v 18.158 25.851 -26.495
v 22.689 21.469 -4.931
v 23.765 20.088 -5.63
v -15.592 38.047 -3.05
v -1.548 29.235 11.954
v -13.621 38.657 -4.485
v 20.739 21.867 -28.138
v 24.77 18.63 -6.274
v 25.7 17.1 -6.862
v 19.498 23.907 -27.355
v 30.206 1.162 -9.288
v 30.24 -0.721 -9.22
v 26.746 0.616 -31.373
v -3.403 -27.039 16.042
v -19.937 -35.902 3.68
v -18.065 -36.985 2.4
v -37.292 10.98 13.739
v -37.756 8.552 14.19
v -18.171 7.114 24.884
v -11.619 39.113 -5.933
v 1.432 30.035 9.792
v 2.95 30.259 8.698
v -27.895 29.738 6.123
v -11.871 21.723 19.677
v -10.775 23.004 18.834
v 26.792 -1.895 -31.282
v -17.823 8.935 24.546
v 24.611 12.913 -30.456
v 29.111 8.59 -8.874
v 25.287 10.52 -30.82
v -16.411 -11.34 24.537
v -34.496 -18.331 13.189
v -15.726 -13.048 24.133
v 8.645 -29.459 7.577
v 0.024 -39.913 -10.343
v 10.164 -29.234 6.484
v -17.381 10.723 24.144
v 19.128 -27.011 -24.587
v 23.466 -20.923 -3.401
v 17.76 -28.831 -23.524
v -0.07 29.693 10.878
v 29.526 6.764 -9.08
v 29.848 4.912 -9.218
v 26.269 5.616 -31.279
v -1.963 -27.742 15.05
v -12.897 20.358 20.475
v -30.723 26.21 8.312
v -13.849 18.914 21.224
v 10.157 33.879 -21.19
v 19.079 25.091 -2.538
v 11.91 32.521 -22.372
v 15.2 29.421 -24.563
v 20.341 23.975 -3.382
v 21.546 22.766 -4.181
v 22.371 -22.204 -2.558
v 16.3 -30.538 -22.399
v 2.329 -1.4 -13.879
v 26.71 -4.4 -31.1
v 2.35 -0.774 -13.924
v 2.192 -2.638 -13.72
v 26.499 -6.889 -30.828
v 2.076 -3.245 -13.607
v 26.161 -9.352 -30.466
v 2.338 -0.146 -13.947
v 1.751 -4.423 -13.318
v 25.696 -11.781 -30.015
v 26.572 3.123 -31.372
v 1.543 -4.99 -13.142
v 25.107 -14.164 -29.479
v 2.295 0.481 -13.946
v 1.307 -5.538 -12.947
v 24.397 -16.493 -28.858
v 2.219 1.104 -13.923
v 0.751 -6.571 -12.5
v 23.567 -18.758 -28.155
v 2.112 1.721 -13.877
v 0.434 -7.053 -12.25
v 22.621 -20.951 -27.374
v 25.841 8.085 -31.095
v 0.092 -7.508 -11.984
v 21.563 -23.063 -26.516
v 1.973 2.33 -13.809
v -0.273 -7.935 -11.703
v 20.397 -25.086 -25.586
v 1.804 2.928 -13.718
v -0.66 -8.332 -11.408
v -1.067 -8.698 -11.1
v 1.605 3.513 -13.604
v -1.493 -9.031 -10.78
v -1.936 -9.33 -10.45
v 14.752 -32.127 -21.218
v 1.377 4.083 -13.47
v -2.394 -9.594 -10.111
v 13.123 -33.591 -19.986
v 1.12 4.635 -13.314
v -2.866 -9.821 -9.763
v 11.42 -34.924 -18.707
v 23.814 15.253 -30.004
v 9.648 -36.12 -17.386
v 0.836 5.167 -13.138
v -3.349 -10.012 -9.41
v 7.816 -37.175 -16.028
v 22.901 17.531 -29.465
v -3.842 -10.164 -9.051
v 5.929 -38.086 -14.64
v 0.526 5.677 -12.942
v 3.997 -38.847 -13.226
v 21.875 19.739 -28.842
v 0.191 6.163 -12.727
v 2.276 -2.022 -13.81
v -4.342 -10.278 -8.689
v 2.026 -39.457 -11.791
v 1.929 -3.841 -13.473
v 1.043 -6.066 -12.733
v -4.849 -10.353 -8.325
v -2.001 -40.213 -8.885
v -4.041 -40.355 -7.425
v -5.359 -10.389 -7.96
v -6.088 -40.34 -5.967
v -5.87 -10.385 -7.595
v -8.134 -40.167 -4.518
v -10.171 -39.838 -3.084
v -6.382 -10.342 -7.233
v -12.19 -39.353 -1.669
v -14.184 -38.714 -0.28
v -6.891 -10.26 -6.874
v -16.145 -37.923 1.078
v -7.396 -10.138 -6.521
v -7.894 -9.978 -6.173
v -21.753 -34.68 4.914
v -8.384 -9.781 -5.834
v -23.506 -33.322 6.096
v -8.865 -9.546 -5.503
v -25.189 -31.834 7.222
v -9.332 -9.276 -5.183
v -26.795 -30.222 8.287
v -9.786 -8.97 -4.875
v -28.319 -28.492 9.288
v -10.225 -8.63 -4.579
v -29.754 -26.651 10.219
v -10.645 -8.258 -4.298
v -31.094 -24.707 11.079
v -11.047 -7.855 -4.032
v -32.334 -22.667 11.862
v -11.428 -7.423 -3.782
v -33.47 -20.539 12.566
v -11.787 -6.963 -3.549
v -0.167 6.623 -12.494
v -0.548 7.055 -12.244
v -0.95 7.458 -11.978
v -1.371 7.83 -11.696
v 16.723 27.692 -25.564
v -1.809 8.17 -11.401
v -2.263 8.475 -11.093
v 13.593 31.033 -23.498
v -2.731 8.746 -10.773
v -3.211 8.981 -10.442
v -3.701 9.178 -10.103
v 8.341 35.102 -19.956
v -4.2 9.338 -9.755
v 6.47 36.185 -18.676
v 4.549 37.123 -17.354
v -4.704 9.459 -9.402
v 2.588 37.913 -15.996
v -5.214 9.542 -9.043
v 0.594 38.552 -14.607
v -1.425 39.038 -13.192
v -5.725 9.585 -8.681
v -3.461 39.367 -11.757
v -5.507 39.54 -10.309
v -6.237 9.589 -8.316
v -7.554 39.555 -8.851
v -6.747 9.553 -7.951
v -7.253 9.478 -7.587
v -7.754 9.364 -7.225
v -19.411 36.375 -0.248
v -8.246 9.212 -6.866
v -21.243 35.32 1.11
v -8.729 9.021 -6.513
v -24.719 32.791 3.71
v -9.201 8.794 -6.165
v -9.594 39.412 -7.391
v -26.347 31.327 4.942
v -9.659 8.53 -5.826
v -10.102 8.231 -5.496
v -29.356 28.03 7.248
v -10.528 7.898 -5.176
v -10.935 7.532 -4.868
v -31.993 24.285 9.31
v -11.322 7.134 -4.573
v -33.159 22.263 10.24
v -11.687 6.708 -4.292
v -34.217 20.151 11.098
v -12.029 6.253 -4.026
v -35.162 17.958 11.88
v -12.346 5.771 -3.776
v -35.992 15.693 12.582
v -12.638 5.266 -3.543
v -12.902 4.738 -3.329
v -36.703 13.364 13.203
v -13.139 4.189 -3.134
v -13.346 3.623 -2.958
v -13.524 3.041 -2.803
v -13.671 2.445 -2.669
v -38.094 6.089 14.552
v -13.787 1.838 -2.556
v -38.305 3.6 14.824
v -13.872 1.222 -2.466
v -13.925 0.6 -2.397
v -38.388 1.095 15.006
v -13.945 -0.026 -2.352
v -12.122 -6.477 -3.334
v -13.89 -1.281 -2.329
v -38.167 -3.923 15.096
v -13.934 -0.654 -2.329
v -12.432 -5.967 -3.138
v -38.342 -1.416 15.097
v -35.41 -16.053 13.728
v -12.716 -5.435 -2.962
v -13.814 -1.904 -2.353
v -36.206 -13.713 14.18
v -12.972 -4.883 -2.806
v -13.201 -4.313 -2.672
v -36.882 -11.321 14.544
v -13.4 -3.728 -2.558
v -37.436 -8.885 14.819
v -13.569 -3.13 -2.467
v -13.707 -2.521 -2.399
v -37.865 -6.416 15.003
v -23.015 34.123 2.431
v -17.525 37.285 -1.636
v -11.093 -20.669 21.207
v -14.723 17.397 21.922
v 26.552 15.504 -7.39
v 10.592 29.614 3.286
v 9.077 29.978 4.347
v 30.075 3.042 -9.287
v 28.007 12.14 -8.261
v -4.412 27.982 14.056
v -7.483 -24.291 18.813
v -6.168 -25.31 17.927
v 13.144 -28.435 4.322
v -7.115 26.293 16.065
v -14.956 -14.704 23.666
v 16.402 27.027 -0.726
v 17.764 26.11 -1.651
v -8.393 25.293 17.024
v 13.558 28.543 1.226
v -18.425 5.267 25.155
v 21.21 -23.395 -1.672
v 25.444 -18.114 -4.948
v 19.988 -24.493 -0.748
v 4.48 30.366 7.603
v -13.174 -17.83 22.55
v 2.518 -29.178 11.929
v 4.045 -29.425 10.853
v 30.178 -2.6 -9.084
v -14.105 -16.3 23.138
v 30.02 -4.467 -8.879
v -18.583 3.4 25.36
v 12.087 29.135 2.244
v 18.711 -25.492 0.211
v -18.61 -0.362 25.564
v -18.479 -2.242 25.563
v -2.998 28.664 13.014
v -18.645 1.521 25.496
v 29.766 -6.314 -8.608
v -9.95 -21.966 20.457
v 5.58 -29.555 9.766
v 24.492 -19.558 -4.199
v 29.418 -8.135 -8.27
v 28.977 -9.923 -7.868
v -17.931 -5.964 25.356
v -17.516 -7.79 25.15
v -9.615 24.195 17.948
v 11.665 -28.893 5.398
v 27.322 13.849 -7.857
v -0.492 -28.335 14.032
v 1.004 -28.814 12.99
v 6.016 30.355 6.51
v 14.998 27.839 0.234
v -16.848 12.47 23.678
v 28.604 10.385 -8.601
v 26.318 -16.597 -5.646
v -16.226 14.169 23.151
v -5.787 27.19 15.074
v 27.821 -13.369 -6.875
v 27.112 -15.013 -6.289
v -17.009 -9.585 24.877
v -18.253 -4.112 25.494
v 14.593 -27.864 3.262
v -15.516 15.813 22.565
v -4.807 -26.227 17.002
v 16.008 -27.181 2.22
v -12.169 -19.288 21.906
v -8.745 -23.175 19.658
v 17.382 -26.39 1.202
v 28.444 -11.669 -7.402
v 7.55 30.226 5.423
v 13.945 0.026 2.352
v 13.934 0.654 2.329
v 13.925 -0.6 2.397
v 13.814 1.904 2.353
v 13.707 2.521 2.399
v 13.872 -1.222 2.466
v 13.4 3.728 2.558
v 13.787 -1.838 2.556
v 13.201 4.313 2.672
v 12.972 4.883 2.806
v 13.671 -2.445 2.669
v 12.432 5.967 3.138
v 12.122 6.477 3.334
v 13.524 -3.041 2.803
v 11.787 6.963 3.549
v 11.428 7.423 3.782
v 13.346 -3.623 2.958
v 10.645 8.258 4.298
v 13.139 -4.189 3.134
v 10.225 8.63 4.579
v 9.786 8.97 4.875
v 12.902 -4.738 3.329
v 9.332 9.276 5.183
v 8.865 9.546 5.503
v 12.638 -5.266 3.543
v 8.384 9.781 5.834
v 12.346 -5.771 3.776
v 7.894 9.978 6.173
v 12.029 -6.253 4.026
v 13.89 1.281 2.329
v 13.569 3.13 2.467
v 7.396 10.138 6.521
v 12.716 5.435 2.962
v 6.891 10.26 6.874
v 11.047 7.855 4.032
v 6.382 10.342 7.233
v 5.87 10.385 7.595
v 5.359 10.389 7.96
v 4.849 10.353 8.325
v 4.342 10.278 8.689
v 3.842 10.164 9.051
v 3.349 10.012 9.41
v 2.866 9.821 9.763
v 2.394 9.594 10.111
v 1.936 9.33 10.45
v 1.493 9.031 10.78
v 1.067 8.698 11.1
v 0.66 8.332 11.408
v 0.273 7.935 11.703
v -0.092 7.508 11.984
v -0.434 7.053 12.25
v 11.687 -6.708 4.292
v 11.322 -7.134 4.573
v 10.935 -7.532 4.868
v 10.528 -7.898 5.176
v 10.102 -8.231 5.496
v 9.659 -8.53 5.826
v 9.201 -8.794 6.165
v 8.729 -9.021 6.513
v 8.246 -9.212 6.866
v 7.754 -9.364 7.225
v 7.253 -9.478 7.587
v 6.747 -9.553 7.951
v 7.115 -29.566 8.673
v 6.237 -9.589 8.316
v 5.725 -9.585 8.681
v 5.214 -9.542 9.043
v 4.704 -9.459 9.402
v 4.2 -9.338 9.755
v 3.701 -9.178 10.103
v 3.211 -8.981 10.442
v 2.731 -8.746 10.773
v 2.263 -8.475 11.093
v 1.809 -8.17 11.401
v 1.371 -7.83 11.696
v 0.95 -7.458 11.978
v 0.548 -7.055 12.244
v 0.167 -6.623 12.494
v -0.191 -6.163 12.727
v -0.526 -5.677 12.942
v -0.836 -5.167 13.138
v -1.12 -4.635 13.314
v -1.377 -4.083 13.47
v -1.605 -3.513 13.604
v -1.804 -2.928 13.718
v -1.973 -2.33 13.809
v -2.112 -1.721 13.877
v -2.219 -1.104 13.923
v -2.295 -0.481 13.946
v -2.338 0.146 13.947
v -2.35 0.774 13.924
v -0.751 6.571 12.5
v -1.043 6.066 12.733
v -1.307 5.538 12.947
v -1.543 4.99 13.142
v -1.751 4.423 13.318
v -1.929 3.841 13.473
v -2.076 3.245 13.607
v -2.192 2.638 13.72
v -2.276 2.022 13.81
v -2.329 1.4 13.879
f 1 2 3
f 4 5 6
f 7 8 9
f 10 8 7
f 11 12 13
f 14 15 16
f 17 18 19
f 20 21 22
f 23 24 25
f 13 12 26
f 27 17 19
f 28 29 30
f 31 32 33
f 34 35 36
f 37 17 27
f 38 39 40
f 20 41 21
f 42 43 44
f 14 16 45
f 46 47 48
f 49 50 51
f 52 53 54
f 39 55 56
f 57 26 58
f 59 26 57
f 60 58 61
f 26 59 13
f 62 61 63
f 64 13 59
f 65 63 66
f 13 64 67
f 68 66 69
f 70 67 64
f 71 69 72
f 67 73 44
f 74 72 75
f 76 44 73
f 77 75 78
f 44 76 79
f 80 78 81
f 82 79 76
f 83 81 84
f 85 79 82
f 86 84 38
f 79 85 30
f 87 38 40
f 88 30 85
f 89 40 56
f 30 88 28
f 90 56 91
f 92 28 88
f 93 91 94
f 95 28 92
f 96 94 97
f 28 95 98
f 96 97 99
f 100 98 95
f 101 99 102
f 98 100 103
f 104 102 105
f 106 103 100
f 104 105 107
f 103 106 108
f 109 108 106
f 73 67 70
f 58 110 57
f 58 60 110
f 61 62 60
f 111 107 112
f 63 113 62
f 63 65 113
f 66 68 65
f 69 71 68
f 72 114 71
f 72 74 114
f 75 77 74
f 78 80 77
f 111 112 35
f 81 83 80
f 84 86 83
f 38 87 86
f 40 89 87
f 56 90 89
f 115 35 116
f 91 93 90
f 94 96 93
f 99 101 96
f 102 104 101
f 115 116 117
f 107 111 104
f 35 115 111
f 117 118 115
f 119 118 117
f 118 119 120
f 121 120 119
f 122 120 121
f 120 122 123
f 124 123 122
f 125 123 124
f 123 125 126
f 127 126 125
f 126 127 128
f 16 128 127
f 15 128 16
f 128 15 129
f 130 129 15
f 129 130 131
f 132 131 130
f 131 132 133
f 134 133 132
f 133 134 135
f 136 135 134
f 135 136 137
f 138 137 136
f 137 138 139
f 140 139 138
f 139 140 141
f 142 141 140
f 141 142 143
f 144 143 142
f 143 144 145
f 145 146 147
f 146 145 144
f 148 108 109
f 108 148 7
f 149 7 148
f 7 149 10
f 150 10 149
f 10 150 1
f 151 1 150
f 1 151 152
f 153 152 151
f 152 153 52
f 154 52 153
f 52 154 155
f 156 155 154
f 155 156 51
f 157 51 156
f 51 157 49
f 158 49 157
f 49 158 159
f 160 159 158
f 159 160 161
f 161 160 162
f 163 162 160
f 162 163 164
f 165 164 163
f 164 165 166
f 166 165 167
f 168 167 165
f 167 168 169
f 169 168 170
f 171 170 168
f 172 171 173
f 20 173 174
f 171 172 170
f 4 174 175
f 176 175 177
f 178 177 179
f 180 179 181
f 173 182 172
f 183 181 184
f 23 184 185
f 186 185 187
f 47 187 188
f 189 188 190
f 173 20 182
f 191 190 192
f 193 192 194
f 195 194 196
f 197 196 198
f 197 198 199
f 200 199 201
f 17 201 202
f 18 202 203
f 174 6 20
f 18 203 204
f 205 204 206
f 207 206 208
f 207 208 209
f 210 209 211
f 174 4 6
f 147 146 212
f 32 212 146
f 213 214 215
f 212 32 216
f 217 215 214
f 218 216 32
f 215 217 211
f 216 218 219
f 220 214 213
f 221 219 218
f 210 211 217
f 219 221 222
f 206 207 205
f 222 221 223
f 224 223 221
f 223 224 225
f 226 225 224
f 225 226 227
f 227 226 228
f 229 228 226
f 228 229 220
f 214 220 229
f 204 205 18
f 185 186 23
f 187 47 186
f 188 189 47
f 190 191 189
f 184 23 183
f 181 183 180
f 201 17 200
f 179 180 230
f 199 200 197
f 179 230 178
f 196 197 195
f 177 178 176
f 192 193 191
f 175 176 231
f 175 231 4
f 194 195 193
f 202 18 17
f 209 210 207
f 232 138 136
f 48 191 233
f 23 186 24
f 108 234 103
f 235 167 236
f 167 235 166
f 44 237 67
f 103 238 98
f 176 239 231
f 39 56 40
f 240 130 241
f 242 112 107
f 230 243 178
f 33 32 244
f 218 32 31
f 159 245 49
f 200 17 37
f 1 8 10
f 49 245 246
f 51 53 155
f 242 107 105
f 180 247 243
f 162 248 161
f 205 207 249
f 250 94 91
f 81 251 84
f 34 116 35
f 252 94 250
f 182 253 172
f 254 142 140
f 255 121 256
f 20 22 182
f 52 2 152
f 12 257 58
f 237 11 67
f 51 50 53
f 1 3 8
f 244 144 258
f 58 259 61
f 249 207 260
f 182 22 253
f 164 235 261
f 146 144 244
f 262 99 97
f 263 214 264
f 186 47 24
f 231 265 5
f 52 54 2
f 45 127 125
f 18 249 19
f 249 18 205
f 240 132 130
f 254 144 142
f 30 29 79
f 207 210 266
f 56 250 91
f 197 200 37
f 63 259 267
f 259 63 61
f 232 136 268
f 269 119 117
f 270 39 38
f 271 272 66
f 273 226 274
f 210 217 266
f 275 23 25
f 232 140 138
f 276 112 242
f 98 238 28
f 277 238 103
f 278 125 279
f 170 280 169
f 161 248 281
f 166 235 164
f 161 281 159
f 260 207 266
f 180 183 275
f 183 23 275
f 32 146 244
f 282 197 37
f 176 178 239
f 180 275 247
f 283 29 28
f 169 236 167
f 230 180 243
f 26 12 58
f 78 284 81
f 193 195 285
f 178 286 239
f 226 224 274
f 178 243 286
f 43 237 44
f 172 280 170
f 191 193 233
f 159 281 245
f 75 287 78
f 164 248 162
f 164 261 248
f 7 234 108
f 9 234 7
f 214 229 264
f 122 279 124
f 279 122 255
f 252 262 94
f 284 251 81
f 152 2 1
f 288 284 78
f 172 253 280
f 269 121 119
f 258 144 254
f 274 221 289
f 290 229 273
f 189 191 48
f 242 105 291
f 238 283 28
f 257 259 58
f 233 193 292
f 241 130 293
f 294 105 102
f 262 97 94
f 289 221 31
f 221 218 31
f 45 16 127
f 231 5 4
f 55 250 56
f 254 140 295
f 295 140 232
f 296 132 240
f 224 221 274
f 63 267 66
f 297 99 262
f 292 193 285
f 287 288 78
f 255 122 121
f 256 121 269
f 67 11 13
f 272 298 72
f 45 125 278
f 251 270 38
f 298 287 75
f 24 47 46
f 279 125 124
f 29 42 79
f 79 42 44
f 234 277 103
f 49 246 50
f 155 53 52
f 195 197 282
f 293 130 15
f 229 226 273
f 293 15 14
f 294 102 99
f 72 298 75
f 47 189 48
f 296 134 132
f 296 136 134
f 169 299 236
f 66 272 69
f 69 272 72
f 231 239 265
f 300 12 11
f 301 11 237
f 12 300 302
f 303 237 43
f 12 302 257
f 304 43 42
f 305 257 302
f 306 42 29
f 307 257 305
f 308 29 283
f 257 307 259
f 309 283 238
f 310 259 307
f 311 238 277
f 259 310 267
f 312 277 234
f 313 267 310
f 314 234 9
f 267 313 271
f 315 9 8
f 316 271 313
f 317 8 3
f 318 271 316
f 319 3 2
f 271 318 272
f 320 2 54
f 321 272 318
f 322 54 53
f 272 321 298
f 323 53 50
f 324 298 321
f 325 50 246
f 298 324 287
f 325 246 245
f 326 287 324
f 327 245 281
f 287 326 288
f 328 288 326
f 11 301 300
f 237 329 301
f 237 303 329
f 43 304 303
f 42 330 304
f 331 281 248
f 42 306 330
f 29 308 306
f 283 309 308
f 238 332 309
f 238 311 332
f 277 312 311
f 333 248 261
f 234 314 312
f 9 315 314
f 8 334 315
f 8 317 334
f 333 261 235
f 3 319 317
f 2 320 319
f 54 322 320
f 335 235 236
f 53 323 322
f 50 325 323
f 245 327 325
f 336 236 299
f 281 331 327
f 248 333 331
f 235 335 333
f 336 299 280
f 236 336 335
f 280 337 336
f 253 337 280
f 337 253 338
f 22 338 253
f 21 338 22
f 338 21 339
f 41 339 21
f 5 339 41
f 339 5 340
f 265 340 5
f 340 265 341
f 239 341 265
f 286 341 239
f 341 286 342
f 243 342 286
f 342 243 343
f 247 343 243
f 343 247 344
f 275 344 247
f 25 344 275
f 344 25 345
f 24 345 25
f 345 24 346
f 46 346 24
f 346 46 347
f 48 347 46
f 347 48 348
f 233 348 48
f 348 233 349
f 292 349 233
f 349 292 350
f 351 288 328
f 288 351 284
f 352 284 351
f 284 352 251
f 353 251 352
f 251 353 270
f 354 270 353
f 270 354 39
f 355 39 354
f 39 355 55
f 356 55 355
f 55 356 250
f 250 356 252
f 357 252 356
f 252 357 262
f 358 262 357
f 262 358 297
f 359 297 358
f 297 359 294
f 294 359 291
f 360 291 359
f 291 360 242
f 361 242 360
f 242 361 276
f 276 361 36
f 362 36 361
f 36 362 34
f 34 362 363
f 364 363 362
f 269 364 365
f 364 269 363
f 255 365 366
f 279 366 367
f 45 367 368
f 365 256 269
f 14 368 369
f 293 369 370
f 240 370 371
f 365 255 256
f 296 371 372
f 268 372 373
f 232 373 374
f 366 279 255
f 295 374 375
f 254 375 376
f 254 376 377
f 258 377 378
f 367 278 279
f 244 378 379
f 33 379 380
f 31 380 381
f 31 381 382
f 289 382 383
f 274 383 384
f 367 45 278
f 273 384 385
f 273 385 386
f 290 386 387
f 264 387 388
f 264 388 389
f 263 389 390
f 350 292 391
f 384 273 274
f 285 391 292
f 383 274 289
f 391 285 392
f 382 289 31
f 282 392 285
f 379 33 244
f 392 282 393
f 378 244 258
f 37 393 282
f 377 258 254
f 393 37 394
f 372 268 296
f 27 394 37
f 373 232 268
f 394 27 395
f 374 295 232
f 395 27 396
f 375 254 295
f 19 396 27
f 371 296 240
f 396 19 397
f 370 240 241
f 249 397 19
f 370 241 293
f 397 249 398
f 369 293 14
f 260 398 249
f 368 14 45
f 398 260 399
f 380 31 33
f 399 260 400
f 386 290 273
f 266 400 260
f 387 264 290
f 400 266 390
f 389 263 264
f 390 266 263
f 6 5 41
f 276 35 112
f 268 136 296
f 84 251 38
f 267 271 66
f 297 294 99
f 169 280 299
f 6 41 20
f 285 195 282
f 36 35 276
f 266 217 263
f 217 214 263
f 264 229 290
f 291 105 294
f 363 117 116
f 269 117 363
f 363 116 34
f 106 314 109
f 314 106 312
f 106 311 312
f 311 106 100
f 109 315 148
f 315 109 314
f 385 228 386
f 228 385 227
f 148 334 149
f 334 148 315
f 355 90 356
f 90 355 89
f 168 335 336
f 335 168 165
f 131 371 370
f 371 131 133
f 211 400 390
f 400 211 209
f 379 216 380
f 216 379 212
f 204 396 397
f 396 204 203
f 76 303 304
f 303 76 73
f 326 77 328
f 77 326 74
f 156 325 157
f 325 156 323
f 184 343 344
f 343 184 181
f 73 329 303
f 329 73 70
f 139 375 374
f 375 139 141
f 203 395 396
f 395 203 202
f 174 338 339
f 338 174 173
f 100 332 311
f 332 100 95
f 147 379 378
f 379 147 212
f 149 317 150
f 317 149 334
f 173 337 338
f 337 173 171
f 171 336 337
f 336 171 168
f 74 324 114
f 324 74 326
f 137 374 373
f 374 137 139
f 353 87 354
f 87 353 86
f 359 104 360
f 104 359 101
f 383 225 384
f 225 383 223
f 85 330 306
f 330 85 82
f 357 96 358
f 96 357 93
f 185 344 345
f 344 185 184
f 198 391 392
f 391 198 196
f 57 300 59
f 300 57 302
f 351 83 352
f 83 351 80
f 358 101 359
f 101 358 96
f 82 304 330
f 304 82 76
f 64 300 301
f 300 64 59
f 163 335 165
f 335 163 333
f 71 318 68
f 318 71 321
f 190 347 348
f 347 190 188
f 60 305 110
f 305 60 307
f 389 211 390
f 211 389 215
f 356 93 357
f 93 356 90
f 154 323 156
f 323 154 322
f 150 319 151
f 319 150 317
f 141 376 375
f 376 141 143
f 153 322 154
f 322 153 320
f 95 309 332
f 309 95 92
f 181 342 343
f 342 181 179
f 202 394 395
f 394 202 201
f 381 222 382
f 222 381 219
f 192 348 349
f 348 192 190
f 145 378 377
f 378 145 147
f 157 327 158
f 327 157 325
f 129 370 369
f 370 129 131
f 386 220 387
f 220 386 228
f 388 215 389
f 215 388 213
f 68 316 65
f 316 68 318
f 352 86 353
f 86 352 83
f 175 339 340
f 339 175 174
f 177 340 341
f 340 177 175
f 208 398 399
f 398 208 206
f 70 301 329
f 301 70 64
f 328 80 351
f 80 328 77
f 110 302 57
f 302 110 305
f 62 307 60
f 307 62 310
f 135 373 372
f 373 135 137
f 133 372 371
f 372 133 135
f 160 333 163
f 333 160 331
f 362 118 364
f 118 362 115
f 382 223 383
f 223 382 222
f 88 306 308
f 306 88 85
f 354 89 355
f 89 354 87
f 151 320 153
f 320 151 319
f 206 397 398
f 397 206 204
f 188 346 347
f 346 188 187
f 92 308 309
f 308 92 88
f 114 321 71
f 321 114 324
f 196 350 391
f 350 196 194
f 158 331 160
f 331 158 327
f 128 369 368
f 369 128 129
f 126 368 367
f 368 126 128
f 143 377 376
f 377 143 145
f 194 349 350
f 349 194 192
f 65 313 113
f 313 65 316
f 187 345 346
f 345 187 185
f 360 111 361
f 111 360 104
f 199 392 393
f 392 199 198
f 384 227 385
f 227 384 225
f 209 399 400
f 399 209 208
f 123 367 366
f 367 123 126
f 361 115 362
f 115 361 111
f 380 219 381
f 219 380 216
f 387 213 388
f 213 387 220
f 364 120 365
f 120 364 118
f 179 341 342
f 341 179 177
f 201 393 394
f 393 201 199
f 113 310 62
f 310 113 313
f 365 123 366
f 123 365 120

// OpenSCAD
union() {
    rotate([20,30,40]) {
        difference() {
            cylinder(20,40,30,true,$fn=100);
            cylinder(200,10,10,true,$fn=100);
        }
    }
}
